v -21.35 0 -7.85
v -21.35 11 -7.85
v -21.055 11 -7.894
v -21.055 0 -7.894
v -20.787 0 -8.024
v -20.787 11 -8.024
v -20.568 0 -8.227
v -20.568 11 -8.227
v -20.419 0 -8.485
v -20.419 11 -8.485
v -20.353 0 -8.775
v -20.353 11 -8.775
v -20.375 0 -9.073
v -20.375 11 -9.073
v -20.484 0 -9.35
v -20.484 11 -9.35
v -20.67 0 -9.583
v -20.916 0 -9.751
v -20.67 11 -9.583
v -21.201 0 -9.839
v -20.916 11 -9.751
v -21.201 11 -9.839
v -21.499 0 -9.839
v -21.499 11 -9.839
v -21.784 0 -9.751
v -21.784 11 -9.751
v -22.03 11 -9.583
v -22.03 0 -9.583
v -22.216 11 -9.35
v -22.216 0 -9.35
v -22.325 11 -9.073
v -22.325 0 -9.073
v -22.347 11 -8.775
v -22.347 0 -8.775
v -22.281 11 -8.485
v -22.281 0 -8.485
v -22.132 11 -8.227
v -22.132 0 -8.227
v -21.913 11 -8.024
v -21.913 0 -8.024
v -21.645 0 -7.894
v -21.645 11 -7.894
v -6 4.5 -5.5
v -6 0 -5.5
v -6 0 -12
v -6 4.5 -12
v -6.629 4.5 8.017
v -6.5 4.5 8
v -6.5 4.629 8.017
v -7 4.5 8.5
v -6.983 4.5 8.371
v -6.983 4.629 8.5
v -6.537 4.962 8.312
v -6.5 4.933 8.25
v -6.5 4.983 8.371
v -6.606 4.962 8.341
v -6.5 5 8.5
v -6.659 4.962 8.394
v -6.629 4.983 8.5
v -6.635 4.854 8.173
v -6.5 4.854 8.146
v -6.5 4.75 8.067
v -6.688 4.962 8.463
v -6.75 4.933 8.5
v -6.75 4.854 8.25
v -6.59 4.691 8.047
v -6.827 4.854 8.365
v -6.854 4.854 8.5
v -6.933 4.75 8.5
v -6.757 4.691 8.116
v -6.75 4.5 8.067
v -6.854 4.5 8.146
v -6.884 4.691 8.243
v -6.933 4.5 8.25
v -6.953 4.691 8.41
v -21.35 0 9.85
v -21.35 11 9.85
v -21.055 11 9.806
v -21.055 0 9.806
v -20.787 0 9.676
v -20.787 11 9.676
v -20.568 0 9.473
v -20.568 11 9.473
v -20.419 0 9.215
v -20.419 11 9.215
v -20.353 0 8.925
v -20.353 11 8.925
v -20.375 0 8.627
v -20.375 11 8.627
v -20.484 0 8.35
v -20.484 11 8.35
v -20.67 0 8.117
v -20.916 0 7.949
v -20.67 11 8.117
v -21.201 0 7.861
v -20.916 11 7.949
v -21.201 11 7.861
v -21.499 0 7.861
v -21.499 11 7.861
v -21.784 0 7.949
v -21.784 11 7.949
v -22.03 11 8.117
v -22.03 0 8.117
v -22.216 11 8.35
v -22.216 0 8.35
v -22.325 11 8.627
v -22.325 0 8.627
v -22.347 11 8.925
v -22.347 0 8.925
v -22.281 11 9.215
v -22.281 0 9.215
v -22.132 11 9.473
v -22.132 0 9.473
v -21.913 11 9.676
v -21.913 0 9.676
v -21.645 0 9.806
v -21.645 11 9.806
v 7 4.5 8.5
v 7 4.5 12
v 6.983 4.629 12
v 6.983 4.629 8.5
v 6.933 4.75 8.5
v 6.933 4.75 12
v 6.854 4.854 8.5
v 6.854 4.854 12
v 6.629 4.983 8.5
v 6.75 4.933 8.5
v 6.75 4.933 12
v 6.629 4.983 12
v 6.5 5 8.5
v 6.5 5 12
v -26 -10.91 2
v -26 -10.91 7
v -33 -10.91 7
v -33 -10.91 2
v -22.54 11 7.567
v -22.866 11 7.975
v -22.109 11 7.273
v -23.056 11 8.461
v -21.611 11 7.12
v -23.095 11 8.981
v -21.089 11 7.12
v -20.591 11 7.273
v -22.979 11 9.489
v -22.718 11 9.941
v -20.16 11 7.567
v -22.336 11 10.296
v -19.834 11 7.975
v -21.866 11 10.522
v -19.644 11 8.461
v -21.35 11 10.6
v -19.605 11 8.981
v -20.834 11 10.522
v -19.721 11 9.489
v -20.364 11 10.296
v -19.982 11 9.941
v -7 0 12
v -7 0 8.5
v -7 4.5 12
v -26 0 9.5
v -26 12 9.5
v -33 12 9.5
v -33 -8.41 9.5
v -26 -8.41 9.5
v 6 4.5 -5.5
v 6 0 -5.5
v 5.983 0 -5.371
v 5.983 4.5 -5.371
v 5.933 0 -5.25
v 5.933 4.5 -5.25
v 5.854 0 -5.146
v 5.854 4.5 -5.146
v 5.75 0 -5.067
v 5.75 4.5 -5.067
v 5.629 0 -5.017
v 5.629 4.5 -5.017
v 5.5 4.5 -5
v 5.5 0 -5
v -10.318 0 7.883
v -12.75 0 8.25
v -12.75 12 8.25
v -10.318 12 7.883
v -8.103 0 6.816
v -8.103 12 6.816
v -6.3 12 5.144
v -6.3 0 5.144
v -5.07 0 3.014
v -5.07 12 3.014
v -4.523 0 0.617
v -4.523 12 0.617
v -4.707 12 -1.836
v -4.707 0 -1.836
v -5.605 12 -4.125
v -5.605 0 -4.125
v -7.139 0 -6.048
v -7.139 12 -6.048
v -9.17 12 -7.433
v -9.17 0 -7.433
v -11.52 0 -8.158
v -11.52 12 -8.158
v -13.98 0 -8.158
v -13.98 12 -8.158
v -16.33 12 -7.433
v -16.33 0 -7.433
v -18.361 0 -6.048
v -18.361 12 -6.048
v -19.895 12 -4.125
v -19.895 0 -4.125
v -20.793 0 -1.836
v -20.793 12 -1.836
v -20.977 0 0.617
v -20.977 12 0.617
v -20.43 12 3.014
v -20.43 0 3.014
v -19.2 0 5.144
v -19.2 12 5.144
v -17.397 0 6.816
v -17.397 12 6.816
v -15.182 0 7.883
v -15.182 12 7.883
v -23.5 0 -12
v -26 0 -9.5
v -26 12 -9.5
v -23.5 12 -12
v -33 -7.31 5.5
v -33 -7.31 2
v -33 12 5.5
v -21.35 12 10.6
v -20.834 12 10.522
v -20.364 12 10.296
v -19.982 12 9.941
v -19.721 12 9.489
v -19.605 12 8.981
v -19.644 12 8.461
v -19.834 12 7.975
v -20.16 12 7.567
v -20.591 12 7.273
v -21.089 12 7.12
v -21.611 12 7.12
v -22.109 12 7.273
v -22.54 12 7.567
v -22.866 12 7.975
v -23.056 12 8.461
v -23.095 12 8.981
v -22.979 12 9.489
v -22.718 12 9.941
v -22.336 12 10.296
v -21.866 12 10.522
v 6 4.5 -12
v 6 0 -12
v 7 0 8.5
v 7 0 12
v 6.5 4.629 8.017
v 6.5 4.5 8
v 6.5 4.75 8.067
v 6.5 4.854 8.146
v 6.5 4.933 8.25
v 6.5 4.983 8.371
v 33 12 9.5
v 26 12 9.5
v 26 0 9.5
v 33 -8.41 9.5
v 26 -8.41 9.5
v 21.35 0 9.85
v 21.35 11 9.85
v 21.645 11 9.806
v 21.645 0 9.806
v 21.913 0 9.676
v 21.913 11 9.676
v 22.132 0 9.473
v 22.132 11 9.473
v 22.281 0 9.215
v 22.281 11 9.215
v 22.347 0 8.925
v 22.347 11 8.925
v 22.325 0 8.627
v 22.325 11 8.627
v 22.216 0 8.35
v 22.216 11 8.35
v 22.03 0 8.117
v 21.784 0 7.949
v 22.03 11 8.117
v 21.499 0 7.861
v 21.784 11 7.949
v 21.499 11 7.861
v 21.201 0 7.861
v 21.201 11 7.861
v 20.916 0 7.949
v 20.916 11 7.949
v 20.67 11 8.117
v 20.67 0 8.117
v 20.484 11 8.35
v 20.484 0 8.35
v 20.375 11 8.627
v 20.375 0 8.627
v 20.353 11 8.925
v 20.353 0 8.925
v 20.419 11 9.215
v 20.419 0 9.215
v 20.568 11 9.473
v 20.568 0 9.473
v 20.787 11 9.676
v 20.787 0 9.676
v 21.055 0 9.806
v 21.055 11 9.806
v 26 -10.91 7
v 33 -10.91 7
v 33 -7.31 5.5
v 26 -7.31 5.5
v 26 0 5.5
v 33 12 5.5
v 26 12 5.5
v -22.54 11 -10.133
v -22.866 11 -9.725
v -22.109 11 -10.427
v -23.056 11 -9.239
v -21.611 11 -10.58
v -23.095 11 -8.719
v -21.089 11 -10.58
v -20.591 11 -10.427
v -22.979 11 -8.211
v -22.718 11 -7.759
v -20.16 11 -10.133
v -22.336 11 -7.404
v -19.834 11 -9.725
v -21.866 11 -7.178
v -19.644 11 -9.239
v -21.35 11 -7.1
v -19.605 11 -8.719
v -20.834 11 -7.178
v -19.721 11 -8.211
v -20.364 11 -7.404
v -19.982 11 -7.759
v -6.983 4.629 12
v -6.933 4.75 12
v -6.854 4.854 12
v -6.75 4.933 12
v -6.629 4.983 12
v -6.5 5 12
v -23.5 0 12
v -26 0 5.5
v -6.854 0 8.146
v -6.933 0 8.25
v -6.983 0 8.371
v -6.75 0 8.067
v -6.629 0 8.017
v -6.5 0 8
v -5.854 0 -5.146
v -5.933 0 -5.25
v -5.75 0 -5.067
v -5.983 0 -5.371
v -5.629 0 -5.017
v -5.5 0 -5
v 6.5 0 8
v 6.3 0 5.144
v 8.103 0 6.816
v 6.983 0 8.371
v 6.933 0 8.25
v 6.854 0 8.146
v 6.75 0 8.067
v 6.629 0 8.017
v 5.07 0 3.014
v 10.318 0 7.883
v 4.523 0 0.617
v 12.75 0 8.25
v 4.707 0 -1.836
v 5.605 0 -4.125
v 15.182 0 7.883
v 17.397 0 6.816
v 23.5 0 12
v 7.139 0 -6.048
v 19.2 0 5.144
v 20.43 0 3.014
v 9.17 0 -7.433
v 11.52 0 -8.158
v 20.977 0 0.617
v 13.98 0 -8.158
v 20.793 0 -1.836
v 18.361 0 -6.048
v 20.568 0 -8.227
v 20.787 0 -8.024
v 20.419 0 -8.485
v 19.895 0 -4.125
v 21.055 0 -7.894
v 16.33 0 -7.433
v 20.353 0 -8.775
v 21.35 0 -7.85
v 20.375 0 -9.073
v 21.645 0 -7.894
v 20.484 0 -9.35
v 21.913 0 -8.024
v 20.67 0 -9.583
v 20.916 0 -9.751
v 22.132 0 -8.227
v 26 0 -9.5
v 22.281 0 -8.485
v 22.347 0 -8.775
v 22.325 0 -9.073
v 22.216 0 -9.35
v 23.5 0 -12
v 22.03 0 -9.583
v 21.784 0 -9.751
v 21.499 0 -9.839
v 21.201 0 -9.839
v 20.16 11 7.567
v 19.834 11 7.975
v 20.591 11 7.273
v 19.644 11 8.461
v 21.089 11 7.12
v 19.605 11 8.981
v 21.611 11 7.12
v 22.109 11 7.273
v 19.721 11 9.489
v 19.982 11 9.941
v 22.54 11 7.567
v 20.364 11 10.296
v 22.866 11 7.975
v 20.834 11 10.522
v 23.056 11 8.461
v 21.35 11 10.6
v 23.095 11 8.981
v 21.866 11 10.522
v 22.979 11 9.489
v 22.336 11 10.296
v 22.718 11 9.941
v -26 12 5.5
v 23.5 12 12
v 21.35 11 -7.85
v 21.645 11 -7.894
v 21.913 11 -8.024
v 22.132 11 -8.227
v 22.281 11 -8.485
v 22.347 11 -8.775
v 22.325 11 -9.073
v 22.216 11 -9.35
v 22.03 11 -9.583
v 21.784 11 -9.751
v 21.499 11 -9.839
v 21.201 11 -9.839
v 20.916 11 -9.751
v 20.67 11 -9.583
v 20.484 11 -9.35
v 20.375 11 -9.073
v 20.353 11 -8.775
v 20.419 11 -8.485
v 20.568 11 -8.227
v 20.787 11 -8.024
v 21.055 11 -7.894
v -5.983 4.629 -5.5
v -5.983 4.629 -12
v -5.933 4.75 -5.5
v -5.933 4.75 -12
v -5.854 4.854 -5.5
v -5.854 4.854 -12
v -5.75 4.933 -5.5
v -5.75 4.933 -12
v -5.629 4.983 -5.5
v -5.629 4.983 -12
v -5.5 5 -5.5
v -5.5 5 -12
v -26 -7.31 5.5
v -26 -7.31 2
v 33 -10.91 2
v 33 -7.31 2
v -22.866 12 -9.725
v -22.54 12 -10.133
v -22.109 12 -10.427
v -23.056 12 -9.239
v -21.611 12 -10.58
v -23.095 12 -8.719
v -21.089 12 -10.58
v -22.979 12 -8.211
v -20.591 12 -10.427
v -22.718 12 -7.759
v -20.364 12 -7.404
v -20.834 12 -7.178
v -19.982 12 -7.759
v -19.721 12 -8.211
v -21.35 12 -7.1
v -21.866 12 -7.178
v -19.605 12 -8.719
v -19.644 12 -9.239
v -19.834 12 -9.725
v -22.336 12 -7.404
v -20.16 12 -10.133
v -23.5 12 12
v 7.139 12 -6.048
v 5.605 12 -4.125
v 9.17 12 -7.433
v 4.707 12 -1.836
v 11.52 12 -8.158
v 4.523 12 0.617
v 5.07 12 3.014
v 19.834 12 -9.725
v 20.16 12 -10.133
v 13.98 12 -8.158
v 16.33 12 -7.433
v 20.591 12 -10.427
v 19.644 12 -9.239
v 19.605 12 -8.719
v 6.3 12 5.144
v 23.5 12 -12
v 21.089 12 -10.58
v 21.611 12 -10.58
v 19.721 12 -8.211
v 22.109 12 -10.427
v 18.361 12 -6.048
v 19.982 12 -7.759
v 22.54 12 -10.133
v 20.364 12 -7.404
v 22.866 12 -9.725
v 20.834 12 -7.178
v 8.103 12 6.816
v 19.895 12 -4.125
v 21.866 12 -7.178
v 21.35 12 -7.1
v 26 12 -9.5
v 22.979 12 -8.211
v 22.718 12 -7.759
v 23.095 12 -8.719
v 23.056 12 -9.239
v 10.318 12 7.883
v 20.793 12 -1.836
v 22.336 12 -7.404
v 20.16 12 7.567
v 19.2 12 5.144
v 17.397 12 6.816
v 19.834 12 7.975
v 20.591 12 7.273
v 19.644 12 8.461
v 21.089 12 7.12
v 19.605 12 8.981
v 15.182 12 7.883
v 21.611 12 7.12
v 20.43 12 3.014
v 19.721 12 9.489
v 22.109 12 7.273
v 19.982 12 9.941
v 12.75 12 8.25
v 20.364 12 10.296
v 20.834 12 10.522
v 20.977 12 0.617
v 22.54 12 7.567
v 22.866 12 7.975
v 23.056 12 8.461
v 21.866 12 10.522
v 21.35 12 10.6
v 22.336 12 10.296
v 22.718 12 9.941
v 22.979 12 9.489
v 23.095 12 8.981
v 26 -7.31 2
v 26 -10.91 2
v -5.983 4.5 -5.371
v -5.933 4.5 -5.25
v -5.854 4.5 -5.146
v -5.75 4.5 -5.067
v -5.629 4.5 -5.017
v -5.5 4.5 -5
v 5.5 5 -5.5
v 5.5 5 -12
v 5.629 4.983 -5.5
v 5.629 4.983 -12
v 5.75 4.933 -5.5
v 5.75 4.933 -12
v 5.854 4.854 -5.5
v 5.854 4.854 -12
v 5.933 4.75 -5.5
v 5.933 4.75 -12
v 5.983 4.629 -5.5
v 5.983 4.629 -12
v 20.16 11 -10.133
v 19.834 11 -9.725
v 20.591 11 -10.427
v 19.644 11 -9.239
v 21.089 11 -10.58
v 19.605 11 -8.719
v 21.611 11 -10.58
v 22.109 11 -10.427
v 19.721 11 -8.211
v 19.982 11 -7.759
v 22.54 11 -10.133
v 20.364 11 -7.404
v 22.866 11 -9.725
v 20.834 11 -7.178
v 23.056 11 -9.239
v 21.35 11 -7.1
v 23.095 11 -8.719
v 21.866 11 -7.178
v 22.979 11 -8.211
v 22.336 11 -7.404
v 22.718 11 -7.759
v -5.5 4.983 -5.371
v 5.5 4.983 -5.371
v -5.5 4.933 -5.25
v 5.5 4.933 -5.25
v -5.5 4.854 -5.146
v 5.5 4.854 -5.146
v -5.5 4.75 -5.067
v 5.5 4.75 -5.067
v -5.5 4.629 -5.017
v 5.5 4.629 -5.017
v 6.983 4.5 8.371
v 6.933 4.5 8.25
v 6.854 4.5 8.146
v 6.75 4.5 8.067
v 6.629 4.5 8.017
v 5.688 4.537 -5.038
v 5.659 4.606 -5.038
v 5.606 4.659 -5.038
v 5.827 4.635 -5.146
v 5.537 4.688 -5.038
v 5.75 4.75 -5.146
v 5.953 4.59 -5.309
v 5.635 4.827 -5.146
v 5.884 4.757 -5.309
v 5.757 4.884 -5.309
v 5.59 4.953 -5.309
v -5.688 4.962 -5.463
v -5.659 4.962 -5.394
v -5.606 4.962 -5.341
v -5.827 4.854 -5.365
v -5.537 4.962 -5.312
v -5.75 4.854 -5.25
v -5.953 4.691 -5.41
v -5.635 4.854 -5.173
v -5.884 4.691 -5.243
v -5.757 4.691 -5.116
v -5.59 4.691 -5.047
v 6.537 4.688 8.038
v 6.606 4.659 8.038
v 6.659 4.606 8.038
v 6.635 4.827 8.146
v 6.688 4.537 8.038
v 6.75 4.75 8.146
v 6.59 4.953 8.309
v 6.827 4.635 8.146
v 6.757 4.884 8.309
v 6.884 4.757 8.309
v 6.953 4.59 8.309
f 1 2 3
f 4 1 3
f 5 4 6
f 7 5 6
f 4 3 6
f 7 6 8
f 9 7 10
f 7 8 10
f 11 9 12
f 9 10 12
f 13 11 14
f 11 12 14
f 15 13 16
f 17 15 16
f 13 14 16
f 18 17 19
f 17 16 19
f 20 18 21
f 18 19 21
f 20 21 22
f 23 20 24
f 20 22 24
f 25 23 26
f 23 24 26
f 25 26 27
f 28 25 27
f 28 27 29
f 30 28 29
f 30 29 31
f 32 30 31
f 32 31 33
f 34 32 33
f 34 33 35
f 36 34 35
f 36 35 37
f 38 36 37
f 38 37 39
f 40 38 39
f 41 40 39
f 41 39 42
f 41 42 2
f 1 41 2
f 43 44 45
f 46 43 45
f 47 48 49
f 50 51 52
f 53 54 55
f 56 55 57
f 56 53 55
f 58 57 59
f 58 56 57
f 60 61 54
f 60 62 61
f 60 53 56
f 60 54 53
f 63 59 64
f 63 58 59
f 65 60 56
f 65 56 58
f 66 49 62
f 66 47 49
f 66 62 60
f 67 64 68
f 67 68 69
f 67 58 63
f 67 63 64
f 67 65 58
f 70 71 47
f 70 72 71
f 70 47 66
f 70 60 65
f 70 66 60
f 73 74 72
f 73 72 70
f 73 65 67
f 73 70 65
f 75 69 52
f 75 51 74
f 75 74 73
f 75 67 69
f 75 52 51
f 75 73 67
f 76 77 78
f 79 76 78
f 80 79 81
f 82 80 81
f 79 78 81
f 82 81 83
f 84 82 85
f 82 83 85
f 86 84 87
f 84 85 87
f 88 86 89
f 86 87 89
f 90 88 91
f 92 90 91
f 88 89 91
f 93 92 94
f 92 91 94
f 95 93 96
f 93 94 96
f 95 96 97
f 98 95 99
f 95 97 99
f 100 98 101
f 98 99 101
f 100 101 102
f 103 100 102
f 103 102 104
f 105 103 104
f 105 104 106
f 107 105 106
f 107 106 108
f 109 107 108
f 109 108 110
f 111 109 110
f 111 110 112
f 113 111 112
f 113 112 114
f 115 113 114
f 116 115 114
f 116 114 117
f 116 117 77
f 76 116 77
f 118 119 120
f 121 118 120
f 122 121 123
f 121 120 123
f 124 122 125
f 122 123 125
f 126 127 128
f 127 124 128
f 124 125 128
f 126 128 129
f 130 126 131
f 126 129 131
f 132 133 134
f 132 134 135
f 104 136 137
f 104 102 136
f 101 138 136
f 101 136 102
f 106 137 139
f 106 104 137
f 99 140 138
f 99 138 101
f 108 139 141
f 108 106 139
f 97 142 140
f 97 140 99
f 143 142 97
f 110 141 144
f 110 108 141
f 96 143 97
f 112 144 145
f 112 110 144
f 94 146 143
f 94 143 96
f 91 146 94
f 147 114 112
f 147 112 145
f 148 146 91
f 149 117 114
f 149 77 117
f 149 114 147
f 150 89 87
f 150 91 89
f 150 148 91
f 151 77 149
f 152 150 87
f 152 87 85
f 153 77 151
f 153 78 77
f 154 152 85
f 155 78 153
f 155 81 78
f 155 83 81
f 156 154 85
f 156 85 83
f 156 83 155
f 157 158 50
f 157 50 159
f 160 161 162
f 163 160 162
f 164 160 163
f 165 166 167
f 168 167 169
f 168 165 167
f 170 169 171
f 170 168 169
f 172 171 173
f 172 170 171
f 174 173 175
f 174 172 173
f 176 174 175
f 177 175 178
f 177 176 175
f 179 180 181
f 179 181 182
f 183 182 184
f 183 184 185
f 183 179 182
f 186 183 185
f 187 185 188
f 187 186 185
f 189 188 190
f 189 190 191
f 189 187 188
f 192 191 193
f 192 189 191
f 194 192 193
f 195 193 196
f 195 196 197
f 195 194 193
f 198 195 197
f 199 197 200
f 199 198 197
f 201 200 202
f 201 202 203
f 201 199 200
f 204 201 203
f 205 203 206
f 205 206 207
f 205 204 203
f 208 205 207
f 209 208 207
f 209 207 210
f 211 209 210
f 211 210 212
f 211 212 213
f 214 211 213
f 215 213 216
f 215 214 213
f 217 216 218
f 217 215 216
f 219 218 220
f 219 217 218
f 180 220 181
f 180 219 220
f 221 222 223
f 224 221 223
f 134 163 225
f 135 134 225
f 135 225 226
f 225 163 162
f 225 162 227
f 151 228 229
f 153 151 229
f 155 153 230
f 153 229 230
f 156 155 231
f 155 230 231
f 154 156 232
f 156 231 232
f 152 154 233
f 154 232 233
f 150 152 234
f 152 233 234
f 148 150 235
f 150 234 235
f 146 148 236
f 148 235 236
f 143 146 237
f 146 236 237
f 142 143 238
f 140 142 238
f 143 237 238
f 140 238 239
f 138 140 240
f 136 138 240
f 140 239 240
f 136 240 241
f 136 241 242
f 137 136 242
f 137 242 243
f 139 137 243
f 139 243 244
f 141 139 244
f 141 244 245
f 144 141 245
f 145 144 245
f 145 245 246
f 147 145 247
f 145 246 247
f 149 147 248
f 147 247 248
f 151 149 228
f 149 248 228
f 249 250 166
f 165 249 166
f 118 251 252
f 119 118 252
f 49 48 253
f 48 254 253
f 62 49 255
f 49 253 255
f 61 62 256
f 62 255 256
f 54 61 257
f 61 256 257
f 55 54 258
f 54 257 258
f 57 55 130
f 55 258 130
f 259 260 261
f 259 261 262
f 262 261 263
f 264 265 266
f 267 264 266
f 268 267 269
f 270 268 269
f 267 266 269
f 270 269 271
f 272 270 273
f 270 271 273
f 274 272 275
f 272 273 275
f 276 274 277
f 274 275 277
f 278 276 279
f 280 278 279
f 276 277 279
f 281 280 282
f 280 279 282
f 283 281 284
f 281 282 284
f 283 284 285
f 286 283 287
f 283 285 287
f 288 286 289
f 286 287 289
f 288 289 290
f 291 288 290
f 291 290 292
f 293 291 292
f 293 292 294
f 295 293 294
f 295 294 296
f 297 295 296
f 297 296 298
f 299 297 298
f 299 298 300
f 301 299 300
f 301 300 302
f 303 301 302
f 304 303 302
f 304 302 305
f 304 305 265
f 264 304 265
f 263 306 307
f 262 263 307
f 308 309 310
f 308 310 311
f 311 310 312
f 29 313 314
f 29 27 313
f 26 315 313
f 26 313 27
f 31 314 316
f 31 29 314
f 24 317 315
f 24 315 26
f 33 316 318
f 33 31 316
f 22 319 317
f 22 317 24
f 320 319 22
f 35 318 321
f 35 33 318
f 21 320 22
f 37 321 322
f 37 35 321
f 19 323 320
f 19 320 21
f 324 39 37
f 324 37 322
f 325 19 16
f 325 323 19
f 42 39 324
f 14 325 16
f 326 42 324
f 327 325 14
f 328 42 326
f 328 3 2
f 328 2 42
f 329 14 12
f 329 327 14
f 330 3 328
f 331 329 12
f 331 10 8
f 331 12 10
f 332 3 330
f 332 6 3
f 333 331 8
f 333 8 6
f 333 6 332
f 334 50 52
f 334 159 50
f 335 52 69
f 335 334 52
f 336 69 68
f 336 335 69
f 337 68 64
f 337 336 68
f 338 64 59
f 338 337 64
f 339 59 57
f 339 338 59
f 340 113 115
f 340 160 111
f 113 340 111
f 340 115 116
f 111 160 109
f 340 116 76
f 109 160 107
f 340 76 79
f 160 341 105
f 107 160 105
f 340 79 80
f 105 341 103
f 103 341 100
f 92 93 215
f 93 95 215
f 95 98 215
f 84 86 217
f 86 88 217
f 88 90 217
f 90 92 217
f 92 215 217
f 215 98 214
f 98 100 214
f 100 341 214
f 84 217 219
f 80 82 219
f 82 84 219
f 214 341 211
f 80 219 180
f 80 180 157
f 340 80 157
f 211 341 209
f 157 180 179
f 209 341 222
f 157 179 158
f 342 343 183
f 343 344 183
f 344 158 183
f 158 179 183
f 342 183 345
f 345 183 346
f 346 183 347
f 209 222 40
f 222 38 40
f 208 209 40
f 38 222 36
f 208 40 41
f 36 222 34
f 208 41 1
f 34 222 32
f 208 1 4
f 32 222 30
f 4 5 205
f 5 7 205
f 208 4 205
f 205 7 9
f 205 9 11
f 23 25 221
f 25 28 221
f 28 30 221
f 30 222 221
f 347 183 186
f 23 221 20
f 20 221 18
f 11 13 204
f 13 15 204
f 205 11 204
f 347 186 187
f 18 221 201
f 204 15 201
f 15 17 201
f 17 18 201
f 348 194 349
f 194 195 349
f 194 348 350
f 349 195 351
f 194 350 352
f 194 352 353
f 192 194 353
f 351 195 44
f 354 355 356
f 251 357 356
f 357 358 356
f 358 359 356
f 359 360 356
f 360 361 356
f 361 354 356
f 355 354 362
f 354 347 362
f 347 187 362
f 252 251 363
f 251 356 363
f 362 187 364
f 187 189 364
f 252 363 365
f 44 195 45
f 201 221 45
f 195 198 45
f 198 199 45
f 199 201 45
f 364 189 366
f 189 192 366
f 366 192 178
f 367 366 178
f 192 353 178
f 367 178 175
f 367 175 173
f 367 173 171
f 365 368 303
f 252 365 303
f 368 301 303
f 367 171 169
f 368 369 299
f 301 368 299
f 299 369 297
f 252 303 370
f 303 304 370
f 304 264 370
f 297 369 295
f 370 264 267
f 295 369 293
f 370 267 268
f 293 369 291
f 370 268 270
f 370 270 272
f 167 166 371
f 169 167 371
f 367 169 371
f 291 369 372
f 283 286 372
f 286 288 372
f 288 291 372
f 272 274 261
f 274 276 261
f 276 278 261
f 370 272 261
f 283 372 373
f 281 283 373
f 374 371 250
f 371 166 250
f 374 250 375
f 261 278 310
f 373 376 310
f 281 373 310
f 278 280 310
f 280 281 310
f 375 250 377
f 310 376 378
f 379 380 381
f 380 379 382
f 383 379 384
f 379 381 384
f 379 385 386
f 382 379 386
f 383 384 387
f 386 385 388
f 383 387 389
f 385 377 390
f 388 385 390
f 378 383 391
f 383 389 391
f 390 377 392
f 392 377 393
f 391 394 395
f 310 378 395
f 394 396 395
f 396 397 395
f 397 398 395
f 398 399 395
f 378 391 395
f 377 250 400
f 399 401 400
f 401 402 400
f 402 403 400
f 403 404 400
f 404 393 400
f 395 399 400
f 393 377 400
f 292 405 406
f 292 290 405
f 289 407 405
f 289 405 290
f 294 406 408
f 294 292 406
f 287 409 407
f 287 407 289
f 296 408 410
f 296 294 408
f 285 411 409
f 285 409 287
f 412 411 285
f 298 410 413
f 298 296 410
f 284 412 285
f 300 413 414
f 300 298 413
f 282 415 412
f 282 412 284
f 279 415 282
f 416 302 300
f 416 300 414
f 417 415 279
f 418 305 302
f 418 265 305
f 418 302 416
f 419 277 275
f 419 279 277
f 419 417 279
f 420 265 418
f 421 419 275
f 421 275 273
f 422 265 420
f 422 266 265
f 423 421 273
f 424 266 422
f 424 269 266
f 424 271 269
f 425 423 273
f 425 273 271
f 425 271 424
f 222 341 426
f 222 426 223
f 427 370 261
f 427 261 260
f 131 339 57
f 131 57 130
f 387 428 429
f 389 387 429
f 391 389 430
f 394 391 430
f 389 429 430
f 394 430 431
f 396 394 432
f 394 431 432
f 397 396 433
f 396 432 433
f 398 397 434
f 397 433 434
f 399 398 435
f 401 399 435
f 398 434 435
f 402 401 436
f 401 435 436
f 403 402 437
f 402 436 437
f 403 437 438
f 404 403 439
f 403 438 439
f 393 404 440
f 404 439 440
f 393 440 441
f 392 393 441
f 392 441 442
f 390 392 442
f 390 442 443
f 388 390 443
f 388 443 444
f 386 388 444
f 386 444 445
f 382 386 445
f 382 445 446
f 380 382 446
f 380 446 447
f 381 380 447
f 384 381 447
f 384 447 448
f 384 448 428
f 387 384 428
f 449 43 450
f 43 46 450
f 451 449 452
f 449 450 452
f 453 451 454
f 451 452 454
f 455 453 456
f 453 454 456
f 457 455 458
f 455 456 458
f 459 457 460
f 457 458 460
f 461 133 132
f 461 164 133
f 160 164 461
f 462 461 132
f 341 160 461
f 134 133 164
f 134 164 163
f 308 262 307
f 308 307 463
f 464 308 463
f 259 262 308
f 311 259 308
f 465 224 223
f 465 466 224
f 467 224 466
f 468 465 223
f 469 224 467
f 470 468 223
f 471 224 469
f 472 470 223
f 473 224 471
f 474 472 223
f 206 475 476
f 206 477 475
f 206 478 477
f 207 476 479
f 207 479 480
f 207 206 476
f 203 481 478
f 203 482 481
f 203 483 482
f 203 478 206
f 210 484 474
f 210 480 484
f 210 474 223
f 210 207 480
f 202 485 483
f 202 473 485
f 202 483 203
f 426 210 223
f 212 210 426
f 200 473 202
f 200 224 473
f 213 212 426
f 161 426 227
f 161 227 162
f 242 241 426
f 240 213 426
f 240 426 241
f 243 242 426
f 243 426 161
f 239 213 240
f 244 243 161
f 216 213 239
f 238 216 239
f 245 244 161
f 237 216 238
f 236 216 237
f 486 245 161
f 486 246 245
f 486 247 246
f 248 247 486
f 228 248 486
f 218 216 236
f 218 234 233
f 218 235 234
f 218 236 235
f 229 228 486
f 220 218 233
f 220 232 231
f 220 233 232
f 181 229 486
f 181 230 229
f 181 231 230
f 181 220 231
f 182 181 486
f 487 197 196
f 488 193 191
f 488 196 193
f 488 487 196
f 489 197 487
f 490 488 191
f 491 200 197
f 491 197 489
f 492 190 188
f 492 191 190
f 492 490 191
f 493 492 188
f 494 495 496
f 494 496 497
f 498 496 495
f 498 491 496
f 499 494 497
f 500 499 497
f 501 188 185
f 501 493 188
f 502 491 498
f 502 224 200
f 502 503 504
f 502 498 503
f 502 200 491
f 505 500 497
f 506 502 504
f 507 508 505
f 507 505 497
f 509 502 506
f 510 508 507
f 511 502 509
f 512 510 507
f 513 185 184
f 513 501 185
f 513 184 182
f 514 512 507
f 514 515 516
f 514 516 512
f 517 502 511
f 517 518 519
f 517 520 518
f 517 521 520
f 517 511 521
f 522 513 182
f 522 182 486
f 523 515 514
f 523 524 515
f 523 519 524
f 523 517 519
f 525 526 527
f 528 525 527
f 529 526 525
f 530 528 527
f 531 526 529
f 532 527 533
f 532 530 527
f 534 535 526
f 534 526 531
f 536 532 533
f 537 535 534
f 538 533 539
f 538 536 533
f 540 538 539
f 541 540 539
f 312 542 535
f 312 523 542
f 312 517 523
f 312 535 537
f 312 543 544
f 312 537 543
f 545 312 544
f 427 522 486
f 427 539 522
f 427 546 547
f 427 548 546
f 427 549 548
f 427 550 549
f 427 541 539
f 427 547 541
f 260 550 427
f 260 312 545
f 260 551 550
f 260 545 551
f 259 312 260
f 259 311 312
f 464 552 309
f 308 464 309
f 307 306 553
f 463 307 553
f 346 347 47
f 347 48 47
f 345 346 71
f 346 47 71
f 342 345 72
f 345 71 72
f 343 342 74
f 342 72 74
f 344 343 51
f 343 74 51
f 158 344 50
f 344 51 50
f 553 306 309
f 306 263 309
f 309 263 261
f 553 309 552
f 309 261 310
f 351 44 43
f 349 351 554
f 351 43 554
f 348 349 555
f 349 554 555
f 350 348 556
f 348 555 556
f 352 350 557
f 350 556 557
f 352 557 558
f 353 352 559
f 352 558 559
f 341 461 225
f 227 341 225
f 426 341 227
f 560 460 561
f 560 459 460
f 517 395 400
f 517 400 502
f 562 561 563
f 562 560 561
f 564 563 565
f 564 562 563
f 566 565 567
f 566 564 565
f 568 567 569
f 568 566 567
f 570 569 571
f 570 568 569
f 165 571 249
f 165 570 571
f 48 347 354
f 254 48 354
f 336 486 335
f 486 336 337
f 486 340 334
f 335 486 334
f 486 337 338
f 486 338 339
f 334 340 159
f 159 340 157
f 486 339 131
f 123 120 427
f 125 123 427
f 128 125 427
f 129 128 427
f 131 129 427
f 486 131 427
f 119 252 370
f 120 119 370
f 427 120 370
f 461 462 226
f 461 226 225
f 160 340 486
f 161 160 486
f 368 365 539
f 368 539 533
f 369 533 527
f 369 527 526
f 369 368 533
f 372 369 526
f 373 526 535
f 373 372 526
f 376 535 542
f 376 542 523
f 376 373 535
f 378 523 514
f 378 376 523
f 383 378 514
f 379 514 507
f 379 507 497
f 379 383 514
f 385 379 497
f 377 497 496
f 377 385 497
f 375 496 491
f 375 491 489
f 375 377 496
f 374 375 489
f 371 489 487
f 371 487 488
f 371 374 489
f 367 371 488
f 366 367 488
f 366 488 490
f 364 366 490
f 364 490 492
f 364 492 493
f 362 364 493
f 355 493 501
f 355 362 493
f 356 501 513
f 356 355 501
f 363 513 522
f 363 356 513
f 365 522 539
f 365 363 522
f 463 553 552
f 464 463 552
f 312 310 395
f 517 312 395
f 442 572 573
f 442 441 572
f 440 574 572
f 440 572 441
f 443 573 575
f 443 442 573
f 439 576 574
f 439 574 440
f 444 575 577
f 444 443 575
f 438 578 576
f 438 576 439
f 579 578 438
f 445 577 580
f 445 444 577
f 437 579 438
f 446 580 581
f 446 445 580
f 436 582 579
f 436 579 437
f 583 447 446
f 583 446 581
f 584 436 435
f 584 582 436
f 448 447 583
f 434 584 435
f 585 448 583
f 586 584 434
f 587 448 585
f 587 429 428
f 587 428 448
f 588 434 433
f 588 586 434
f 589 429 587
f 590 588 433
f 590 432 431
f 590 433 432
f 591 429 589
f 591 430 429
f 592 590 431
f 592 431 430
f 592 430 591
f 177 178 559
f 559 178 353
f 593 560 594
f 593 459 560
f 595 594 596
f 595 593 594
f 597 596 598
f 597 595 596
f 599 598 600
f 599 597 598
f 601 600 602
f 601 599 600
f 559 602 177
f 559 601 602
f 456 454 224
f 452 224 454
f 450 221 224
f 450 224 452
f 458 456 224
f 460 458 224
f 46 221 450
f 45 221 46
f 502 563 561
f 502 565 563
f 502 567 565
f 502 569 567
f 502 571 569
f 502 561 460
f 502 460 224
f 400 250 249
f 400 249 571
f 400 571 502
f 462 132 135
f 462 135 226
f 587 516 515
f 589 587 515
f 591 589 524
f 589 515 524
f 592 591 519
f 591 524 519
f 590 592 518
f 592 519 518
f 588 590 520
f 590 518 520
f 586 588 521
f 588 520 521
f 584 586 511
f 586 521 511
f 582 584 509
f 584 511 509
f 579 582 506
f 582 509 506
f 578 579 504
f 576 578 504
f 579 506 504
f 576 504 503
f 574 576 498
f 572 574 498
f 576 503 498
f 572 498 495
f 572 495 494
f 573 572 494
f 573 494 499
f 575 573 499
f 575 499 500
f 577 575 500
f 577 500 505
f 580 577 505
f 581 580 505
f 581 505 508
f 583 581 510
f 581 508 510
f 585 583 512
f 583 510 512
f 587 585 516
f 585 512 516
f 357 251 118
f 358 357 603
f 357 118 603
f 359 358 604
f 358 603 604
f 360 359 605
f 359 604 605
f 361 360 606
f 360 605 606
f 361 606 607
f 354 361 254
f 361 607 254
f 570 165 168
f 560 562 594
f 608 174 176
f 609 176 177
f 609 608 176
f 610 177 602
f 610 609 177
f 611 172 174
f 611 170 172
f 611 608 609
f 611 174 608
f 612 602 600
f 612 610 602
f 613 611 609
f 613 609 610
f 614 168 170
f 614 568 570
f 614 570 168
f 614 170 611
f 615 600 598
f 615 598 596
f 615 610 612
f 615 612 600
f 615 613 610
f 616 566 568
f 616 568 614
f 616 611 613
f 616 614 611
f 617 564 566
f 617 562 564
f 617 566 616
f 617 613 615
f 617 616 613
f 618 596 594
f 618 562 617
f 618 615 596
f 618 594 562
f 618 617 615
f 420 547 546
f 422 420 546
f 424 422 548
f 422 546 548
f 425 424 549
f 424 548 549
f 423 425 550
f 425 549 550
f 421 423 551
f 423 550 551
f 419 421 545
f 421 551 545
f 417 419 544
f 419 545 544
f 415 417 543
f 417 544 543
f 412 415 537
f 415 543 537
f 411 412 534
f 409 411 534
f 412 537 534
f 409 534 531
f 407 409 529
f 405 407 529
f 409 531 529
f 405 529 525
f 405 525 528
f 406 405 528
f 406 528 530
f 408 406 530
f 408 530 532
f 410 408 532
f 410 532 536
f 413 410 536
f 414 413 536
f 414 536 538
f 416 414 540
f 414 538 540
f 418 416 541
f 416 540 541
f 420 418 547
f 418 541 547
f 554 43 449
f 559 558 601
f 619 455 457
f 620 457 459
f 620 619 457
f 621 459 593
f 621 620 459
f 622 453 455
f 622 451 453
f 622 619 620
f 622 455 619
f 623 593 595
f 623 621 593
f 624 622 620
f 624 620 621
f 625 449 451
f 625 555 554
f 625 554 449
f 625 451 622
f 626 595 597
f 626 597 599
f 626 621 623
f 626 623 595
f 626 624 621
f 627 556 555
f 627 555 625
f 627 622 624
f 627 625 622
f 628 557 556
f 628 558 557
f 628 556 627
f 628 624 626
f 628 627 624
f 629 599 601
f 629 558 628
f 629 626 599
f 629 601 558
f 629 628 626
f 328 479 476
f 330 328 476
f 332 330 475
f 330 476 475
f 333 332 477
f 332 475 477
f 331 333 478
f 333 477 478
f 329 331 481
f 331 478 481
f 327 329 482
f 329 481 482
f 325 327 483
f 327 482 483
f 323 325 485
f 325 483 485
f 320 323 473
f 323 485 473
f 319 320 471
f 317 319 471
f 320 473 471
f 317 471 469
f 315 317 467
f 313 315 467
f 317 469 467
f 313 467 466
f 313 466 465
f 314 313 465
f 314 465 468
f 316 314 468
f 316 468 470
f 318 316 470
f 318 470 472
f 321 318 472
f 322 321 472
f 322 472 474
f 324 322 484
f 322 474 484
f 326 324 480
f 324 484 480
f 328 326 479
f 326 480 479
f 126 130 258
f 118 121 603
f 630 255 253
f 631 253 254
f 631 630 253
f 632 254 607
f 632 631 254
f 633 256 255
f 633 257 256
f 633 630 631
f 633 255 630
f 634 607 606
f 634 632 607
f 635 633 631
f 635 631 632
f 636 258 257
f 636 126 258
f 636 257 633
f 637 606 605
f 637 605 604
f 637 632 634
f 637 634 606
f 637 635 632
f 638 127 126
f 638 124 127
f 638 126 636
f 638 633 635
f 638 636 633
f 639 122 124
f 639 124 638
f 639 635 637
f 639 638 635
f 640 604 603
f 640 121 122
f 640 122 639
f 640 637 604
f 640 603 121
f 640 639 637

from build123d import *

# Parameters (mm, degrees)
SKETCH1_W           = 52
SKETCH1_H           = 24
SKETCH1_R           = 8.25
BOSS_EXTRUDE1_DEPTH = 12
SKETCH2_R           = 1
CUT_EXTRUDE1_DEPTH  = 32.048349393
SKETCH3_R           = 1.75
CUT_EXTRUDE2_DEPTH  = 1
CUT_EXTRUDE3_DEPTH  = 5
FILLET3_R           = 0.5
CHAMFER1_SIZE       = 2.5
SKETCH5_W           = 14
SKETCH5_H           = 8
CUT_EXTRUDE4_DEPTH  = 5
FILLET4_R           = 0.5
BOSS_EXTRUDE2_DEPTH = 7
BOSS_EXTRUDE3_START = -52
BOSS_EXTRUDE3_DEPTH = 7
CHAMFER2_SIZE       = 2.5


with BuildPart() as part:
    # Sketch1 → Boss-Extrude1 (new body)
    with BuildSketch(Plane(origin=(0, 0, 0), x_dir=(1, 0, 0), z_dir=(0, 1, 0))):
        Rectangle(SKETCH1_W, SKETCH1_H)
        with Locations(Location((12.75, 0, 0), (0, 0, 270))):
            Circle(SKETCH1_R, mode=Mode.SUBTRACT)
        with Locations(Location((-12.75, 0, 0), (0, 0, 270))):
            Circle(SKETCH1_R, mode=Mode.SUBTRACT)
    extrude(amount=BOSS_EXTRUDE1_DEPTH)

    # Sketch2 → Cut-Extrude1 (cut, through all)
    with BuildSketch(Plane(origin=(0, 12, 0), x_dir=(1, 0, 0), z_dir=(0, 1, 0))):
        with Locations(Location((-21.35, 8.85, 0), (0, 0, 270))):
            Circle(SKETCH2_R)
        with Locations(Location((21.35, 8.85, 0), (0, 0, 270))):
            Circle(SKETCH2_R)
        with Locations(Location((21.35, -8.85, 0), (0, 0, 270))):
            Circle(SKETCH2_R)
        with Locations(Location((-21.35, -8.85, 0), (0, 0, 270))):
            Circle(SKETCH2_R)
    extrude(amount=-CUT_EXTRUDE1_DEPTH, mode=Mode.SUBTRACT)

    # Sketch3 → Cut-Extrude2 (cut)
    with BuildSketch(Plane(origin=(0, 12, 0), x_dir=(1, 0, 0), z_dir=(0, 1, 0))):
        with Locations(Location((-21.35, 8.85, 0), (0, 0, 270))):
            Circle(SKETCH3_R)
        with Locations(Location((21.35, 8.85, 0), (0, 0, 270))):
            Circle(SKETCH3_R)
        with Locations(Location((21.35, -8.85, 0), (0, 0, 270))):
            Circle(SKETCH3_R)
        with Locations(Location((-21.35, -8.85, 0), (0, 0, 270))):
            Circle(SKETCH3_R)
    extrude(amount=-CUT_EXTRUDE2_DEPTH, mode=Mode.SUBTRACT)

    # Sketch4 → Cut-Extrude3 (cut)
    with BuildSketch(Plane.XZ):
        Polygon((-6, -5), (-6, -12), (6, -12), (6, -5), (0, -5), align=None)
    extrude(amount=-CUT_EXTRUDE3_DEPTH, mode=Mode.SUBTRACT)

    # Fillet3
    fillet3_edges = [part.edges().sort_by_distance(p)[0] for p in [
        (-6, 2.5, -5),
        (6, 5, -8.5),
        (6, 2.5, -5),
        (-6, 5, -8.5),
        (0, 5, -5),
    ]]
    fillet(fillet3_edges, radius=FILLET3_R)

    # Chamfer1
    chamfer1_edges = [part.edges().sort_by_distance(p)[0] for p in [
        (26, 6, 12),
        (-26, 6, 12),
        (-26, 6, -12),
        (26, 6, -12),
    ]]
    chamfer(chamfer1_edges, length=CHAMFER1_SIZE)

    # Sketch5 → Cut-Extrude4 (cut)
    with BuildSketch(Plane.XZ):
        with Locations((0, 12)):
            Rectangle(SKETCH5_W, SKETCH5_H)
    extrude(amount=-CUT_EXTRUDE4_DEPTH, mode=Mode.SUBTRACT)

    # Fillet4
    fillet4_edges = [part.edges().sort_by_distance(p)[0] for p in [
        (-7, 2.5, 8),
        (7, 5, 10),
        (0, 5, 8),
        (-7, 5, 10),
        (7, 2.5, 8),
    ]]
    fillet(fillet4_edges, radius=FILLET4_R)

    # Sketch6 → Boss-Extrude2 (add)
    with BuildSketch(Plane(origin=(26, 0, 0), x_dir=(0, 0, -1), z_dir=(1, 0, 0))):
        Polygon((-5.5, 0), (-5.5, 12), (-9.5, 12), (-9.5, -10.909520595), (-2, -10.909520595), (-2, -7.309520595), (-5.5, -7.309520595), align=None)
    extrude(amount=BOSS_EXTRUDE2_DEPTH)

    # Sketch6<2> → Boss-Extrude3 (add)
    with BuildSketch(Plane(origin=(26, 0, 0), x_dir=(0, 0, -1), z_dir=(1, 0, 0)).offset(BOSS_EXTRUDE3_START)):
        Polygon((-5.5, 0), (-5.5, 12), (-9.5, 12), (-9.5, -10.909520595), (-2, -10.909520595), (-2, -7.309520595), (-5.5, -7.309520595), align=None)
    extrude(amount=-BOSS_EXTRUDE3_DEPTH)

    # Chamfer2
    chamfer2_edges = [part.edges().sort_by_distance(p)[0] for p in [
        (29.5, -10.909520595, 9.5),
        (-29.5, -10.909520595, 9.5),
    ]]
    chamfer(chamfer2_edges, length=CHAMFER2_SIZE)


solid = part.part
